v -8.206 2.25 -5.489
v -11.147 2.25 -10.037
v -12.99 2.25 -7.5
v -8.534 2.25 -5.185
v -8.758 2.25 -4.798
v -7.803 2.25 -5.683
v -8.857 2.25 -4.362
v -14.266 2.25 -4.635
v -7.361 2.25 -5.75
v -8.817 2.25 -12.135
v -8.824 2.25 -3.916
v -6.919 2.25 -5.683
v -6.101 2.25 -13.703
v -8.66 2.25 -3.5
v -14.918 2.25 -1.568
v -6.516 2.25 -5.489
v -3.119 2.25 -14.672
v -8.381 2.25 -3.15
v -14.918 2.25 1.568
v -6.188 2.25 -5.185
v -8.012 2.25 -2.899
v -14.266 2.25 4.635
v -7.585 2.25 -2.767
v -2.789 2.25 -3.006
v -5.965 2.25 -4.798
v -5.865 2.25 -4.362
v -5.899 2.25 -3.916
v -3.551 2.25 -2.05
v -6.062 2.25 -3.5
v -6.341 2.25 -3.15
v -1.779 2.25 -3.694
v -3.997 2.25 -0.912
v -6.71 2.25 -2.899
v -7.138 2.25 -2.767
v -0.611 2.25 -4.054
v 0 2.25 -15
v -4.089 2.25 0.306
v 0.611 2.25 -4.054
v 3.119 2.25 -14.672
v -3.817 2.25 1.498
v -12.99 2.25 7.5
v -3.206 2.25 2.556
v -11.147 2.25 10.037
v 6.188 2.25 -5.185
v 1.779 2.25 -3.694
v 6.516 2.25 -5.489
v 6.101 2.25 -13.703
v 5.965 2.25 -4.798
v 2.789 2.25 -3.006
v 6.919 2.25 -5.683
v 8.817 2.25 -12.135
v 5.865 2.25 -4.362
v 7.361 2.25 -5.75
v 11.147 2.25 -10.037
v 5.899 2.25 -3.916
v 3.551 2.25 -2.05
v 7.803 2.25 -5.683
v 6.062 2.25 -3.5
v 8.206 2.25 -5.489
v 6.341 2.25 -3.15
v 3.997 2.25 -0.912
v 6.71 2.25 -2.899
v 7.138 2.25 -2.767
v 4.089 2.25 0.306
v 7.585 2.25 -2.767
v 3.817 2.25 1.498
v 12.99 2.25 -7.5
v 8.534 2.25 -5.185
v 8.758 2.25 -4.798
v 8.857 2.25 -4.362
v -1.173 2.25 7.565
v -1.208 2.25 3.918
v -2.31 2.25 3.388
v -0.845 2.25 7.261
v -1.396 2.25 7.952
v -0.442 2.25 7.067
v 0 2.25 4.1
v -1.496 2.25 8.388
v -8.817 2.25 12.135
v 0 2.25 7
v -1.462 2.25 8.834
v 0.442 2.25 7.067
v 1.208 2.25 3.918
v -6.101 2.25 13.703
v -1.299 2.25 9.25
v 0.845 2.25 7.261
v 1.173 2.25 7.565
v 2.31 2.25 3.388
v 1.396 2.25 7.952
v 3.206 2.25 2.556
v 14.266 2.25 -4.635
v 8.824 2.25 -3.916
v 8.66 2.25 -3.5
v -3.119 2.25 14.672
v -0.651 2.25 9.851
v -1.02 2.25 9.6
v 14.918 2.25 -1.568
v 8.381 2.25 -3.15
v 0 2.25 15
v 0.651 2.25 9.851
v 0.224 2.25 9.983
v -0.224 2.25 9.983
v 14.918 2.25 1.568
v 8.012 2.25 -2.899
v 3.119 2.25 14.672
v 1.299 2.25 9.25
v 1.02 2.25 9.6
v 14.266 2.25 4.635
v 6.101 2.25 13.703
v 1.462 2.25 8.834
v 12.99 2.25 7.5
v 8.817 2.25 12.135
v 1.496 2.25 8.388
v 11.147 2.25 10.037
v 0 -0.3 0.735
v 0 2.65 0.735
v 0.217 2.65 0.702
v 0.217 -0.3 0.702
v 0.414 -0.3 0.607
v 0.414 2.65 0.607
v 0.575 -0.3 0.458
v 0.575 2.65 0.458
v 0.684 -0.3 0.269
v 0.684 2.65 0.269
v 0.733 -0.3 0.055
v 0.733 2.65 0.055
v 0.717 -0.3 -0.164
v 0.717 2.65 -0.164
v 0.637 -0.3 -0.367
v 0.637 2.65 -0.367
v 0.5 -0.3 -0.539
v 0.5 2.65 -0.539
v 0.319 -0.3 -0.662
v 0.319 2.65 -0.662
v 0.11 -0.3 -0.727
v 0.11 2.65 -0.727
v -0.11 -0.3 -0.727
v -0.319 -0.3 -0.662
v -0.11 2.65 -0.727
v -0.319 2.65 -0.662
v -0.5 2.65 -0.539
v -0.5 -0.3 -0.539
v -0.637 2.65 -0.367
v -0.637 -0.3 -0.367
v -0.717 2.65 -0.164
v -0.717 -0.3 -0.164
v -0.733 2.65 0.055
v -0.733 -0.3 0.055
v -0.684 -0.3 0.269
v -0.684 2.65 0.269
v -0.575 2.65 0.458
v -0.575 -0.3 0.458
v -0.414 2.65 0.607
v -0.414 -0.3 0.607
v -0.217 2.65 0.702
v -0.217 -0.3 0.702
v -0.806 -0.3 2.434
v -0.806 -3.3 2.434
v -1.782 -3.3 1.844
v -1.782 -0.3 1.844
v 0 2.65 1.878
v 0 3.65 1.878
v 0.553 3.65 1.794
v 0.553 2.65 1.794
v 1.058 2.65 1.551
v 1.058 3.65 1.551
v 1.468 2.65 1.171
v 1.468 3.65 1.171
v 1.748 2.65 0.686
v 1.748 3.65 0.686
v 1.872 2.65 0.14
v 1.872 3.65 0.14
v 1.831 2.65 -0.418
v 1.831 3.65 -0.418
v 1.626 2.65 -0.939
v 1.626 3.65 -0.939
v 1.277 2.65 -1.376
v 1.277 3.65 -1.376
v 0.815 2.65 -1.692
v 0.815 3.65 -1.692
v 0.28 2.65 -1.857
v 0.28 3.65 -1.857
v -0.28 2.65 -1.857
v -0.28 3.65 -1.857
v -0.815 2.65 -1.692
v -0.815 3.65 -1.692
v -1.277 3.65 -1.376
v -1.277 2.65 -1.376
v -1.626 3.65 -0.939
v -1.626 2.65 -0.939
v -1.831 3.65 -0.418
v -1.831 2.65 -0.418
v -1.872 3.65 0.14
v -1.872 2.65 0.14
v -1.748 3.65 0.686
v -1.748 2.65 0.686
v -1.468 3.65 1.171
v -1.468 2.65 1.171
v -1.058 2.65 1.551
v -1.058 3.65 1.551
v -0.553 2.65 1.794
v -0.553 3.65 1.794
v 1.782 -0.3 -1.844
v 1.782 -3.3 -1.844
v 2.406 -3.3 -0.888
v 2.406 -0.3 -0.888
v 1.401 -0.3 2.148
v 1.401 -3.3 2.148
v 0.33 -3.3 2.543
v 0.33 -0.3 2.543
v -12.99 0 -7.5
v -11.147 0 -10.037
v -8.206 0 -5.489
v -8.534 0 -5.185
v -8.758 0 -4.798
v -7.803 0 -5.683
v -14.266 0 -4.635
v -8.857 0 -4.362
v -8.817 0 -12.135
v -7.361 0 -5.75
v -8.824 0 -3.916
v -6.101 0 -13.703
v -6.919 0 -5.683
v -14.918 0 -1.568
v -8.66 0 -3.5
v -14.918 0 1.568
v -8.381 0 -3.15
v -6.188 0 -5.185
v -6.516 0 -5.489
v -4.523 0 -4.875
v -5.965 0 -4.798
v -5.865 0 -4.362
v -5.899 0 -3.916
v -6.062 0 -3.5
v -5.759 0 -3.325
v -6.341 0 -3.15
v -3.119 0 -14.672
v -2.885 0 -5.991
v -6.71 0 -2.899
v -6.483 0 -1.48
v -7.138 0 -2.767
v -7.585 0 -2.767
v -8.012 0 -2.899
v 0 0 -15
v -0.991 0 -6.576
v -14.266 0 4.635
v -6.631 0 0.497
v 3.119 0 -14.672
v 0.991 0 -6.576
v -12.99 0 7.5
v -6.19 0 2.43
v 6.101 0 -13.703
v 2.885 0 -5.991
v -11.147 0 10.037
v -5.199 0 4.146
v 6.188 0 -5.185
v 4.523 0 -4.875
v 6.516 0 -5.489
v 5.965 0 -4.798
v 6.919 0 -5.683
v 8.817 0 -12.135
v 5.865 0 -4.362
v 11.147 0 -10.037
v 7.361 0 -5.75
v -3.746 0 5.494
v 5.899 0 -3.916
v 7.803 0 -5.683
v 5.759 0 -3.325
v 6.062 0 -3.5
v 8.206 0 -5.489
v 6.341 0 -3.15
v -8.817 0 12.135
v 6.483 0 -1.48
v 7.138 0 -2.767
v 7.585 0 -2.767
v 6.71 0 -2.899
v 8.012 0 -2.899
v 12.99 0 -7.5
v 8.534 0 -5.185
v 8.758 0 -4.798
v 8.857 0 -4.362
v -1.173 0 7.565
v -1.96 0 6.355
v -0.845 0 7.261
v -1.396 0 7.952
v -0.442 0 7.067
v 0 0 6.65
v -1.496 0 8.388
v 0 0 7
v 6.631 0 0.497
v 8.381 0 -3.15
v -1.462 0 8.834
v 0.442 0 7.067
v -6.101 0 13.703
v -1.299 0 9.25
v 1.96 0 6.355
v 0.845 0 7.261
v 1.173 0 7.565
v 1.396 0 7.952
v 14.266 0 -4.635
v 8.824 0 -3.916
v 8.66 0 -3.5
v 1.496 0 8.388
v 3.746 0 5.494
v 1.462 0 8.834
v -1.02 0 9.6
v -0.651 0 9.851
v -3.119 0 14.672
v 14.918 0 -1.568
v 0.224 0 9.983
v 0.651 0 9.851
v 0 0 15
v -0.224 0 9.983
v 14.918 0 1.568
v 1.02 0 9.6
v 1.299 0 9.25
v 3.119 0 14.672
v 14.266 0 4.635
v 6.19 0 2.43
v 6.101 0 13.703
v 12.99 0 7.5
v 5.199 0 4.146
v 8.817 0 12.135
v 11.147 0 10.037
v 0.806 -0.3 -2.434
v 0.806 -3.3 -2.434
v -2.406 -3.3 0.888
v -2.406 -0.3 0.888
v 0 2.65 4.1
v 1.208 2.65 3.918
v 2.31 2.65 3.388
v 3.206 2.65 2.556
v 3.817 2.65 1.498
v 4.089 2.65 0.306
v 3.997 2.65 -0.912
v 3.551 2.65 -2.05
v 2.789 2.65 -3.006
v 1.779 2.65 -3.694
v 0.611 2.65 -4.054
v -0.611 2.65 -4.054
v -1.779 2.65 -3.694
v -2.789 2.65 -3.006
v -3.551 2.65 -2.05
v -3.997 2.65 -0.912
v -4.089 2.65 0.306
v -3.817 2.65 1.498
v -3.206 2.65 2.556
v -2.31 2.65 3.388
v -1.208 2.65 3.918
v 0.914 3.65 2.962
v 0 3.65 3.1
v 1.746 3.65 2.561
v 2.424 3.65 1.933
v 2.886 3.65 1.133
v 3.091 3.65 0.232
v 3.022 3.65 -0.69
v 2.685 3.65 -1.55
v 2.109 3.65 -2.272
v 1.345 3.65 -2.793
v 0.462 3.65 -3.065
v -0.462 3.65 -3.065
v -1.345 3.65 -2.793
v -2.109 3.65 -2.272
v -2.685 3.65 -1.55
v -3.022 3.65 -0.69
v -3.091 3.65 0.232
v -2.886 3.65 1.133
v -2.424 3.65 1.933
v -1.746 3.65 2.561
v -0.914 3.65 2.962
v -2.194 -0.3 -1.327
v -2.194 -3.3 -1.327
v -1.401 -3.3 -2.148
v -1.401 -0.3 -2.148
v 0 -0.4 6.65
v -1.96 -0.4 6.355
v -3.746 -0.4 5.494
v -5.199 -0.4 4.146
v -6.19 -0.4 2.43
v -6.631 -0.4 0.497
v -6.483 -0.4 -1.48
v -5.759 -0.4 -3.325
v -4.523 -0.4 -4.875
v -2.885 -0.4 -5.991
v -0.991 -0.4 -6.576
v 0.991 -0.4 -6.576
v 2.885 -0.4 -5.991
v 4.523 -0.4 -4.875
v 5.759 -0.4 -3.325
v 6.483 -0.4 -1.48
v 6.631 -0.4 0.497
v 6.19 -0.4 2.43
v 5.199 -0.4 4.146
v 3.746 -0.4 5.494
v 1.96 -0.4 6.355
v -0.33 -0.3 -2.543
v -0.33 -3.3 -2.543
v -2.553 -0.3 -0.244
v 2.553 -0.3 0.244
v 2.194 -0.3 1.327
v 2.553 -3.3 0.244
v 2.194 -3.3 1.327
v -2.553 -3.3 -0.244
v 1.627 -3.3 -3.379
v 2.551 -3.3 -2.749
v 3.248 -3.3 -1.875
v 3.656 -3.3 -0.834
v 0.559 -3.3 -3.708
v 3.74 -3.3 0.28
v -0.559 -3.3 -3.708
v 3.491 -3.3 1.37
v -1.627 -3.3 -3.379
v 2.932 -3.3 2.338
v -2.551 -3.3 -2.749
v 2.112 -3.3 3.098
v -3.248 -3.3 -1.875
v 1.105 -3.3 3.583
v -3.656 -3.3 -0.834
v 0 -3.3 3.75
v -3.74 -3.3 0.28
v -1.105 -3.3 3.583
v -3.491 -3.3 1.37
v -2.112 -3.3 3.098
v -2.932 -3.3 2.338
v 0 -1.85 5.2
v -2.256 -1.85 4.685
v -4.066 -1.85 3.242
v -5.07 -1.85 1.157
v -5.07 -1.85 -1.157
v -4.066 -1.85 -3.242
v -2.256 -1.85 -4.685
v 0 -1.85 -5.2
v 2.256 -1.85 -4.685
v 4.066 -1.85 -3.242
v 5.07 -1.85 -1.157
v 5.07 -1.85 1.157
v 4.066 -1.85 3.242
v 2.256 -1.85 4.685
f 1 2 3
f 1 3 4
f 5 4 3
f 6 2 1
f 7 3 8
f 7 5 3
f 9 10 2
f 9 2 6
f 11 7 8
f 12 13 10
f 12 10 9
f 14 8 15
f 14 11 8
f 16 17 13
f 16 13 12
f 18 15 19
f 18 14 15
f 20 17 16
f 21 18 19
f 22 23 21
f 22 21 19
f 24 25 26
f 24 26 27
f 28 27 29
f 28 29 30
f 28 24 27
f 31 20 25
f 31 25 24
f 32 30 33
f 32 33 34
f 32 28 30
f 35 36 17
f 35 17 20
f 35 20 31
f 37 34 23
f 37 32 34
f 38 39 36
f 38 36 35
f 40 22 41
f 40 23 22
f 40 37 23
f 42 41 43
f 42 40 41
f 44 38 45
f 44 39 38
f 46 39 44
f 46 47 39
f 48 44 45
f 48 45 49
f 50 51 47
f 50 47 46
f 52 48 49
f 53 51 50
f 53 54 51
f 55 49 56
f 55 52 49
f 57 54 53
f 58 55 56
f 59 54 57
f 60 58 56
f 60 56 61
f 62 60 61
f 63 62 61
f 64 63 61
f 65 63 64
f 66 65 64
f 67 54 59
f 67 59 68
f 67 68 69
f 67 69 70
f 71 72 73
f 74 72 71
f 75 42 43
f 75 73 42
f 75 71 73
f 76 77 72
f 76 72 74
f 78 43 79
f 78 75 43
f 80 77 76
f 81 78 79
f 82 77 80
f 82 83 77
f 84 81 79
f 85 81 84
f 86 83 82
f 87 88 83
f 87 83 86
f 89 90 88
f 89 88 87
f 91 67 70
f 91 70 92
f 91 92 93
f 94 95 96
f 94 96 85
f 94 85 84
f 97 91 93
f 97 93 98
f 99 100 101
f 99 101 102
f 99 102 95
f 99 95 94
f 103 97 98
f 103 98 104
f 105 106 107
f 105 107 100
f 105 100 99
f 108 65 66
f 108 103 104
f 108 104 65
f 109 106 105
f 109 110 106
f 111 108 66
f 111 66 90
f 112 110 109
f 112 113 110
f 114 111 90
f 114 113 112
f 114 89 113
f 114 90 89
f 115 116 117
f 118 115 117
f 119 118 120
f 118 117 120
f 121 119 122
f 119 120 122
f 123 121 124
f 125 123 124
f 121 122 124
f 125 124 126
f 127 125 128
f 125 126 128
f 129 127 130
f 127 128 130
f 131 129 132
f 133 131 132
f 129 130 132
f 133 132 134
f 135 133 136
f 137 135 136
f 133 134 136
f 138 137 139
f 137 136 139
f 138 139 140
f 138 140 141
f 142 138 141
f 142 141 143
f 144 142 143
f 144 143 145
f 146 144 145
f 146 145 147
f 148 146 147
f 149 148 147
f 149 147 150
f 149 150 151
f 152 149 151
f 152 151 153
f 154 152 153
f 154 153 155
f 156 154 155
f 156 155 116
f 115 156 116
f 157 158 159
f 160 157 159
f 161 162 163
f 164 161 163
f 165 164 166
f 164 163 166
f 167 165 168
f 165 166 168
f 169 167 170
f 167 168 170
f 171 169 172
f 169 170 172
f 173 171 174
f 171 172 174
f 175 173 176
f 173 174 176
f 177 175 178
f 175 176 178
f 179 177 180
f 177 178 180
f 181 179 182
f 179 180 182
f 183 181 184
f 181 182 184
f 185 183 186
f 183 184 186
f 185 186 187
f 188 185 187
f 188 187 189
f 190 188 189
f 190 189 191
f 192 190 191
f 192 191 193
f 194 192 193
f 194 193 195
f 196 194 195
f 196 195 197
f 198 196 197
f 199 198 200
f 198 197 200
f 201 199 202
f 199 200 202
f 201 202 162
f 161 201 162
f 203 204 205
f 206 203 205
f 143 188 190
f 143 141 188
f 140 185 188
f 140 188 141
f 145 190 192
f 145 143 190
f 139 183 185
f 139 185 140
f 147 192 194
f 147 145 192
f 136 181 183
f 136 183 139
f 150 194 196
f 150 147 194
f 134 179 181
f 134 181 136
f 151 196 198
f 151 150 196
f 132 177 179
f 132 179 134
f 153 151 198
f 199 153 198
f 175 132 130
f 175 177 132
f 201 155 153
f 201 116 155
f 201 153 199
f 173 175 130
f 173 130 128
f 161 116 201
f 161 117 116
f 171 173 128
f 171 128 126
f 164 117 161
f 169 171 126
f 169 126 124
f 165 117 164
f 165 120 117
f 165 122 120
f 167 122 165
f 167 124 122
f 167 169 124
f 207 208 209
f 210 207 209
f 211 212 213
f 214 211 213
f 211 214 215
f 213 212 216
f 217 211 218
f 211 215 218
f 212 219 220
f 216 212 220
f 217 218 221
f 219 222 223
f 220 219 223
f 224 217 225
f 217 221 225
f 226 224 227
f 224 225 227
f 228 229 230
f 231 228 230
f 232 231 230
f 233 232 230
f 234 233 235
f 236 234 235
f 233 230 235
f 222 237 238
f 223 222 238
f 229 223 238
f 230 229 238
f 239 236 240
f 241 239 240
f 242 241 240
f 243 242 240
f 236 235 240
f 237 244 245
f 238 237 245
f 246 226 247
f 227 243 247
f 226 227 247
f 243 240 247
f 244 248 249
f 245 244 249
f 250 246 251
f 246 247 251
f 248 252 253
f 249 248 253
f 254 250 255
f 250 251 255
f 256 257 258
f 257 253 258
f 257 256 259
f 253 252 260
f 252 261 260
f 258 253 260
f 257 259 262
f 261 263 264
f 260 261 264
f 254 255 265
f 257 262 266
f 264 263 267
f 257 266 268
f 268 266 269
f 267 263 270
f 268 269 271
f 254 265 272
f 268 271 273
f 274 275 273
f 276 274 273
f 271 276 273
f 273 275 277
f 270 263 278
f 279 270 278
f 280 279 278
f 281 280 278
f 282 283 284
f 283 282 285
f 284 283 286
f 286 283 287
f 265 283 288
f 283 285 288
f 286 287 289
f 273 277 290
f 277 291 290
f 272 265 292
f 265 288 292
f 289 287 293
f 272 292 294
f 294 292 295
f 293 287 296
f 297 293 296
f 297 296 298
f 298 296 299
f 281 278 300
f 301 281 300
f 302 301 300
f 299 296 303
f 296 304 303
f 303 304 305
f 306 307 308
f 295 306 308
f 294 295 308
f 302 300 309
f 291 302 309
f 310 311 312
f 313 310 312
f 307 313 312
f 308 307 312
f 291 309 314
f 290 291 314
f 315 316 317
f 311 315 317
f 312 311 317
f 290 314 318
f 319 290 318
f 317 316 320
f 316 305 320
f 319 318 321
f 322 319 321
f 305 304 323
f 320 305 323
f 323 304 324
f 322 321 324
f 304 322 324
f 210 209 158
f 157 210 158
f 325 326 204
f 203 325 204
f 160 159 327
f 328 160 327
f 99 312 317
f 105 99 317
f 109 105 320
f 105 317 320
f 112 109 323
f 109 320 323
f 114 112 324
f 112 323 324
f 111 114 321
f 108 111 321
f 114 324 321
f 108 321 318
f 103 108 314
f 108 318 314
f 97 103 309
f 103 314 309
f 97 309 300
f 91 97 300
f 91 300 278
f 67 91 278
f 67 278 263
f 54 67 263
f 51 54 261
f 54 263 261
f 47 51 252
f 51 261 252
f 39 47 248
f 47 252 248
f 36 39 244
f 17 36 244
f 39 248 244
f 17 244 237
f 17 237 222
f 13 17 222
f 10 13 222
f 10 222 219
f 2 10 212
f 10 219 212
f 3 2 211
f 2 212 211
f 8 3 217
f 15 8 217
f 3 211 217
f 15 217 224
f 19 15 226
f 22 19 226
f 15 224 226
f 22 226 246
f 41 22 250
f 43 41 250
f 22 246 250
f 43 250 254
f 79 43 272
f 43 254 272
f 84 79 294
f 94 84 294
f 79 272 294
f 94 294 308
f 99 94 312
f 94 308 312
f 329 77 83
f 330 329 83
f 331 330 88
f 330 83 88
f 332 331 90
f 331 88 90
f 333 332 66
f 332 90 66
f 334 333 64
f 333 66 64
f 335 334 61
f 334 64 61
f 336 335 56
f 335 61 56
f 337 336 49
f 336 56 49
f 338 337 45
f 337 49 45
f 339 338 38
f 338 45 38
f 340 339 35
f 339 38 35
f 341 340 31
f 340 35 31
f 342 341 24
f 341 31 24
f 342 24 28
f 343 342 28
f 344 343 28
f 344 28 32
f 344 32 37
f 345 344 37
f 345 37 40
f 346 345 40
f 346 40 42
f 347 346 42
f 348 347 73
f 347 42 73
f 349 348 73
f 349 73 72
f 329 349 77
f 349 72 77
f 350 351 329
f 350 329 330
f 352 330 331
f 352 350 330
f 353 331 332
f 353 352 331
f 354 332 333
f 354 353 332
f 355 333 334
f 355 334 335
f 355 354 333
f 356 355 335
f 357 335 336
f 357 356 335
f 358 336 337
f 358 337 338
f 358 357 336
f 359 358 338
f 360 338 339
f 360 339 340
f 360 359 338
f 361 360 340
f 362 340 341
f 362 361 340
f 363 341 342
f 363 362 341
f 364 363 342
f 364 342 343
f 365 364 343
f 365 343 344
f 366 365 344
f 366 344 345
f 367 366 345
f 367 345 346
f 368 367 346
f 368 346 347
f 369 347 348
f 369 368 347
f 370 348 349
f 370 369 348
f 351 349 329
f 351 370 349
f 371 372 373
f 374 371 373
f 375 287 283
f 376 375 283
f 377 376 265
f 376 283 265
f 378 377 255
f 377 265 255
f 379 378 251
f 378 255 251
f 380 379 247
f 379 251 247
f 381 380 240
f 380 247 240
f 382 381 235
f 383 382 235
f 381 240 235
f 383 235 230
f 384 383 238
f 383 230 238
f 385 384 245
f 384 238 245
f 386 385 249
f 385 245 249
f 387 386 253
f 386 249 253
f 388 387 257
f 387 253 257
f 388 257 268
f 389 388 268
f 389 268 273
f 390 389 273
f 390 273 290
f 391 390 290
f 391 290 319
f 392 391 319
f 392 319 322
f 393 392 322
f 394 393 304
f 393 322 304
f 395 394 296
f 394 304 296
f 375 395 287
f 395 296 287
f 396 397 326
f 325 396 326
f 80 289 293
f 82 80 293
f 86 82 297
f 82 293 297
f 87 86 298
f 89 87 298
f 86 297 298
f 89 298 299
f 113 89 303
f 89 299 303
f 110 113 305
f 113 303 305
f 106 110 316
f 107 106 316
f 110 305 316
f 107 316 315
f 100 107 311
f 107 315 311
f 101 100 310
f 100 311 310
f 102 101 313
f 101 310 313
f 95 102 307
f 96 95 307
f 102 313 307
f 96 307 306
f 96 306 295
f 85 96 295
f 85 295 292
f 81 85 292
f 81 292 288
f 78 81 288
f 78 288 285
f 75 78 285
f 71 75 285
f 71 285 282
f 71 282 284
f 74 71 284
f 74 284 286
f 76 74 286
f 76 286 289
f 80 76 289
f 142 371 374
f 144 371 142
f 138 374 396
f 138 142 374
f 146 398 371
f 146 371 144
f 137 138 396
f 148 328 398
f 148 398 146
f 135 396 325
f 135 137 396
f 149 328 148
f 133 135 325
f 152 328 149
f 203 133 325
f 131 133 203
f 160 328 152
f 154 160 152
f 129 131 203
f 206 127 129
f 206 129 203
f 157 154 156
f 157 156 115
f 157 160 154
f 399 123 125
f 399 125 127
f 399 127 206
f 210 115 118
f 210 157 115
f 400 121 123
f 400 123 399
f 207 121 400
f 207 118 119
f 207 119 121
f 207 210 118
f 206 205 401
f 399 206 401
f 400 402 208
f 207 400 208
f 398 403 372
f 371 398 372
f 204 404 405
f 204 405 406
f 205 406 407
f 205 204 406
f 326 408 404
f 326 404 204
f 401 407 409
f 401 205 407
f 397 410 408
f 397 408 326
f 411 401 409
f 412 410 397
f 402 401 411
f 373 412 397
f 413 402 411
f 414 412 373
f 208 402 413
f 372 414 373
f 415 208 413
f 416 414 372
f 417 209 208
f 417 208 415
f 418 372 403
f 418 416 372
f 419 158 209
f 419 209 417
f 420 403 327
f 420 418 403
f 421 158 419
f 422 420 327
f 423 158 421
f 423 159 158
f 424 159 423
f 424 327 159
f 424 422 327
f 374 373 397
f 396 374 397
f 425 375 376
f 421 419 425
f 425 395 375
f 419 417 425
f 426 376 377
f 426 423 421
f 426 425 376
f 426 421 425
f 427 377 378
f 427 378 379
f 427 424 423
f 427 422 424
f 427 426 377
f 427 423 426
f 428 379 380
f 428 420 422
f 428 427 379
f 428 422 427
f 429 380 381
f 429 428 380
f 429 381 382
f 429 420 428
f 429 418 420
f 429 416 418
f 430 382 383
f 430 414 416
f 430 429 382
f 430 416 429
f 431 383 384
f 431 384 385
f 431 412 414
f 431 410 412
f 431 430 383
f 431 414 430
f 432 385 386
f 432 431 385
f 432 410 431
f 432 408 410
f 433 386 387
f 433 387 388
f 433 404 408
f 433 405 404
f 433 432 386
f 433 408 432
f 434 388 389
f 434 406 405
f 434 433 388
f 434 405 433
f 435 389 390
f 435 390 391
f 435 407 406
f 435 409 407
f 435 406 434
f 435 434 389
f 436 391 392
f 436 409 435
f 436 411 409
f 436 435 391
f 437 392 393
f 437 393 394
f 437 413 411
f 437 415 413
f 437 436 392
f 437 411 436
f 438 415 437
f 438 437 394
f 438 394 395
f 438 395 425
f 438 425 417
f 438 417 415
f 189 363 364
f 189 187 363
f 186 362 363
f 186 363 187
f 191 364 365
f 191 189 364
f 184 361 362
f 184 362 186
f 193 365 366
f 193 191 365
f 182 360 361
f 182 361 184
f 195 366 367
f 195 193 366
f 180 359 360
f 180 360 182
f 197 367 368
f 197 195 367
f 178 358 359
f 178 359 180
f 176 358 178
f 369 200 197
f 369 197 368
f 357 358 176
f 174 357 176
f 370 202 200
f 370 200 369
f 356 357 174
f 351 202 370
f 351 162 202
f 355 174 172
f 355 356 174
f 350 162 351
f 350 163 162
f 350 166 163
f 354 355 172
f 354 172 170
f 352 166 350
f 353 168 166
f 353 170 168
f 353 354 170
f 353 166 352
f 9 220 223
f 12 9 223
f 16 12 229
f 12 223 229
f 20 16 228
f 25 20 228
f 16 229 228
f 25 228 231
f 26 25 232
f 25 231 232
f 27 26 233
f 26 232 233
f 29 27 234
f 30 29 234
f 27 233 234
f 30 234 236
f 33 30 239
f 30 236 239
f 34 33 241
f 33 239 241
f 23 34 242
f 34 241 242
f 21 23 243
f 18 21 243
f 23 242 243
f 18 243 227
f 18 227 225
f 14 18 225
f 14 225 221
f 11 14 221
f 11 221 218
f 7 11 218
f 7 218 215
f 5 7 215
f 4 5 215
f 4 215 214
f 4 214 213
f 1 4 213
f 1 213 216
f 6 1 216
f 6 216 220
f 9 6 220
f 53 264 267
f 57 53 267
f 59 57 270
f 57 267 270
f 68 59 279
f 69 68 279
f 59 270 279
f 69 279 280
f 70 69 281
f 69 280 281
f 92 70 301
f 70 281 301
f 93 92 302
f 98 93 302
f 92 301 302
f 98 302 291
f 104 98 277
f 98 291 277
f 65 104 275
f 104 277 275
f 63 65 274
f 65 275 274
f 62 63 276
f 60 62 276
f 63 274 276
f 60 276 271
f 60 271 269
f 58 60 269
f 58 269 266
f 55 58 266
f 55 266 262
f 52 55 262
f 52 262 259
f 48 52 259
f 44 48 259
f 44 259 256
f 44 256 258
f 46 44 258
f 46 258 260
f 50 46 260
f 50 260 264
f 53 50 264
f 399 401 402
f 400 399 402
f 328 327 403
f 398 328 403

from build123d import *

# Parameters (mm, degrees)
SKETCH_1_R          = 15
EXTRUDE_1_DEPTH     = 2.25
SKETCH_2_R          = 4.1
EXTRUDE_2_DEPTH     = 1.4
CHAMFER_1_SIZE      = 1
SKETCH_3_R          = 6.65
EXTRUDE_3_DEPTH     = 3.3
CHAMFER_2_SIZE      = 2.9
CUT_EXTRUDE_2_DEPTH = 3
SKETCH_5_R          = 1.877591738
CUT_EXTRUDE_3_DEPTH = 1
SKETCH_6_R          = 0.7349705
CUT_EXTRUDE_4_DEPTH = 10
SKETCH_7_R          = 1.5
CUT_EXTRUDE_5_DEPTH = 10


with BuildPart() as part:
    # Эскиз1 → Бобышка-Вытянуть1 (new body)
    with BuildSketch(Plane(origin=(0, 0, 0), x_dir=(1, 0, 0), z_dir=(0, 1, 0))):
        with Locations(Location((0, 0, 0), (0, 0, 270))):
            Circle(SKETCH_1_R)
    extrude(amount=EXTRUDE_1_DEPTH)

    # Эскиз2 → Бобышка-Вытянуть2 (add)
    with BuildSketch(Plane(origin=(0, 2.25, 0), x_dir=(1, 0, 0), z_dir=(0, 1, 0))):
        with Locations(Location((0, 0, 0), (0, 0, 270))):
            Circle(SKETCH_2_R)
    extrude(amount=EXTRUDE_2_DEPTH)

    # Фаска1
    chamfer_1_edges = [part.edges().sort_by_distance(p)[0] for p in [
        (0, 3.65, -4.1),
    ]]
    chamfer(chamfer_1_edges, length=CHAMFER_1_SIZE)

    # Эскиз3 → Бобышка-Вытянуть3 (add)
    with BuildSketch(Plane.XZ):
        with Locations(Location((0, 0, 0), (0, 0, 90))):
            Circle(SKETCH_3_R)
    extrude(amount=EXTRUDE_3_DEPTH)

    # Фаска2
    chamfer_2_edges = [part.edges().sort_by_distance(p)[0] for p in [
        (0, -3.3, -6.65),
    ]]
    chamfer(chamfer_2_edges, length=CHAMFER_2_SIZE)

    # Эскиз4 → Вырез-Вытянуть2 (cut)
    with BuildSketch(Plane.XZ.offset(3.3)):
        Polygon((-0.805649398, 2.434445177), (-1.782131202, 1.843801142), (-2.405640065, 0.887969677), (-2.55268241, -0.243735072), (-2.194134697, -1.3271651), (-1.401011698, -2.147733805), (-0.33040115, -2.542917488), (0.805649398, -2.434445177), (1.782131202, -1.843801142), (2.405640065, -0.887969677), (2.55268241, 0.243735072), (2.194134697, 1.3271651), (1.401011698, 2.147733805), (0.33040115, 2.542917488), align=None)
    extrude(amount=-CUT_EXTRUDE_2_DEPTH, mode=Mode.SUBTRACT)

    # Эскиз5 → Вырез-Вытянуть3 (cut)
    with BuildSketch(Plane(origin=(0, 3.65, 0), x_dir=(1, 0, 0), z_dir=(0, 1, 0))):
        with Locations(Location((0, 0, 0), (0, 0, 270))):
            Circle(SKETCH_5_R)
    extrude(amount=-CUT_EXTRUDE_3_DEPTH, mode=Mode.SUBTRACT)

    # Эскиз6 → Вырез-Вытянуть4 (cut)
    with BuildSketch(Plane(origin=(0, 2.65, 0), x_dir=(1, 0, 0), z_dir=(0, 1, 0))):
        with Locations(Location((0, 0, 0), (0, 0, 270))):
            Circle(SKETCH_6_R)
    extrude(amount=-CUT_EXTRUDE_4_DEPTH, mode=Mode.SUBTRACT)

    # Эскиз7 → Вырез-Вытянуть5 (cut)
    with BuildSketch(Plane.XZ):
        with Locations(Location((-7.361215932, -4.25, 0), (0, 0, 270))):
            Circle(SKETCH_7_R)
        with Locations(Location((7.361215932, -4.25, 0), (0, 0, 270))):
            Circle(SKETCH_7_R)
        with Locations(Location((0, 8.5, 0), (0, 0, 270))):
            Circle(SKETCH_7_R)
    extrude(amount=-CUT_EXTRUDE_5_DEPTH, mode=Mode.SUBTRACT)


solid = part.part
